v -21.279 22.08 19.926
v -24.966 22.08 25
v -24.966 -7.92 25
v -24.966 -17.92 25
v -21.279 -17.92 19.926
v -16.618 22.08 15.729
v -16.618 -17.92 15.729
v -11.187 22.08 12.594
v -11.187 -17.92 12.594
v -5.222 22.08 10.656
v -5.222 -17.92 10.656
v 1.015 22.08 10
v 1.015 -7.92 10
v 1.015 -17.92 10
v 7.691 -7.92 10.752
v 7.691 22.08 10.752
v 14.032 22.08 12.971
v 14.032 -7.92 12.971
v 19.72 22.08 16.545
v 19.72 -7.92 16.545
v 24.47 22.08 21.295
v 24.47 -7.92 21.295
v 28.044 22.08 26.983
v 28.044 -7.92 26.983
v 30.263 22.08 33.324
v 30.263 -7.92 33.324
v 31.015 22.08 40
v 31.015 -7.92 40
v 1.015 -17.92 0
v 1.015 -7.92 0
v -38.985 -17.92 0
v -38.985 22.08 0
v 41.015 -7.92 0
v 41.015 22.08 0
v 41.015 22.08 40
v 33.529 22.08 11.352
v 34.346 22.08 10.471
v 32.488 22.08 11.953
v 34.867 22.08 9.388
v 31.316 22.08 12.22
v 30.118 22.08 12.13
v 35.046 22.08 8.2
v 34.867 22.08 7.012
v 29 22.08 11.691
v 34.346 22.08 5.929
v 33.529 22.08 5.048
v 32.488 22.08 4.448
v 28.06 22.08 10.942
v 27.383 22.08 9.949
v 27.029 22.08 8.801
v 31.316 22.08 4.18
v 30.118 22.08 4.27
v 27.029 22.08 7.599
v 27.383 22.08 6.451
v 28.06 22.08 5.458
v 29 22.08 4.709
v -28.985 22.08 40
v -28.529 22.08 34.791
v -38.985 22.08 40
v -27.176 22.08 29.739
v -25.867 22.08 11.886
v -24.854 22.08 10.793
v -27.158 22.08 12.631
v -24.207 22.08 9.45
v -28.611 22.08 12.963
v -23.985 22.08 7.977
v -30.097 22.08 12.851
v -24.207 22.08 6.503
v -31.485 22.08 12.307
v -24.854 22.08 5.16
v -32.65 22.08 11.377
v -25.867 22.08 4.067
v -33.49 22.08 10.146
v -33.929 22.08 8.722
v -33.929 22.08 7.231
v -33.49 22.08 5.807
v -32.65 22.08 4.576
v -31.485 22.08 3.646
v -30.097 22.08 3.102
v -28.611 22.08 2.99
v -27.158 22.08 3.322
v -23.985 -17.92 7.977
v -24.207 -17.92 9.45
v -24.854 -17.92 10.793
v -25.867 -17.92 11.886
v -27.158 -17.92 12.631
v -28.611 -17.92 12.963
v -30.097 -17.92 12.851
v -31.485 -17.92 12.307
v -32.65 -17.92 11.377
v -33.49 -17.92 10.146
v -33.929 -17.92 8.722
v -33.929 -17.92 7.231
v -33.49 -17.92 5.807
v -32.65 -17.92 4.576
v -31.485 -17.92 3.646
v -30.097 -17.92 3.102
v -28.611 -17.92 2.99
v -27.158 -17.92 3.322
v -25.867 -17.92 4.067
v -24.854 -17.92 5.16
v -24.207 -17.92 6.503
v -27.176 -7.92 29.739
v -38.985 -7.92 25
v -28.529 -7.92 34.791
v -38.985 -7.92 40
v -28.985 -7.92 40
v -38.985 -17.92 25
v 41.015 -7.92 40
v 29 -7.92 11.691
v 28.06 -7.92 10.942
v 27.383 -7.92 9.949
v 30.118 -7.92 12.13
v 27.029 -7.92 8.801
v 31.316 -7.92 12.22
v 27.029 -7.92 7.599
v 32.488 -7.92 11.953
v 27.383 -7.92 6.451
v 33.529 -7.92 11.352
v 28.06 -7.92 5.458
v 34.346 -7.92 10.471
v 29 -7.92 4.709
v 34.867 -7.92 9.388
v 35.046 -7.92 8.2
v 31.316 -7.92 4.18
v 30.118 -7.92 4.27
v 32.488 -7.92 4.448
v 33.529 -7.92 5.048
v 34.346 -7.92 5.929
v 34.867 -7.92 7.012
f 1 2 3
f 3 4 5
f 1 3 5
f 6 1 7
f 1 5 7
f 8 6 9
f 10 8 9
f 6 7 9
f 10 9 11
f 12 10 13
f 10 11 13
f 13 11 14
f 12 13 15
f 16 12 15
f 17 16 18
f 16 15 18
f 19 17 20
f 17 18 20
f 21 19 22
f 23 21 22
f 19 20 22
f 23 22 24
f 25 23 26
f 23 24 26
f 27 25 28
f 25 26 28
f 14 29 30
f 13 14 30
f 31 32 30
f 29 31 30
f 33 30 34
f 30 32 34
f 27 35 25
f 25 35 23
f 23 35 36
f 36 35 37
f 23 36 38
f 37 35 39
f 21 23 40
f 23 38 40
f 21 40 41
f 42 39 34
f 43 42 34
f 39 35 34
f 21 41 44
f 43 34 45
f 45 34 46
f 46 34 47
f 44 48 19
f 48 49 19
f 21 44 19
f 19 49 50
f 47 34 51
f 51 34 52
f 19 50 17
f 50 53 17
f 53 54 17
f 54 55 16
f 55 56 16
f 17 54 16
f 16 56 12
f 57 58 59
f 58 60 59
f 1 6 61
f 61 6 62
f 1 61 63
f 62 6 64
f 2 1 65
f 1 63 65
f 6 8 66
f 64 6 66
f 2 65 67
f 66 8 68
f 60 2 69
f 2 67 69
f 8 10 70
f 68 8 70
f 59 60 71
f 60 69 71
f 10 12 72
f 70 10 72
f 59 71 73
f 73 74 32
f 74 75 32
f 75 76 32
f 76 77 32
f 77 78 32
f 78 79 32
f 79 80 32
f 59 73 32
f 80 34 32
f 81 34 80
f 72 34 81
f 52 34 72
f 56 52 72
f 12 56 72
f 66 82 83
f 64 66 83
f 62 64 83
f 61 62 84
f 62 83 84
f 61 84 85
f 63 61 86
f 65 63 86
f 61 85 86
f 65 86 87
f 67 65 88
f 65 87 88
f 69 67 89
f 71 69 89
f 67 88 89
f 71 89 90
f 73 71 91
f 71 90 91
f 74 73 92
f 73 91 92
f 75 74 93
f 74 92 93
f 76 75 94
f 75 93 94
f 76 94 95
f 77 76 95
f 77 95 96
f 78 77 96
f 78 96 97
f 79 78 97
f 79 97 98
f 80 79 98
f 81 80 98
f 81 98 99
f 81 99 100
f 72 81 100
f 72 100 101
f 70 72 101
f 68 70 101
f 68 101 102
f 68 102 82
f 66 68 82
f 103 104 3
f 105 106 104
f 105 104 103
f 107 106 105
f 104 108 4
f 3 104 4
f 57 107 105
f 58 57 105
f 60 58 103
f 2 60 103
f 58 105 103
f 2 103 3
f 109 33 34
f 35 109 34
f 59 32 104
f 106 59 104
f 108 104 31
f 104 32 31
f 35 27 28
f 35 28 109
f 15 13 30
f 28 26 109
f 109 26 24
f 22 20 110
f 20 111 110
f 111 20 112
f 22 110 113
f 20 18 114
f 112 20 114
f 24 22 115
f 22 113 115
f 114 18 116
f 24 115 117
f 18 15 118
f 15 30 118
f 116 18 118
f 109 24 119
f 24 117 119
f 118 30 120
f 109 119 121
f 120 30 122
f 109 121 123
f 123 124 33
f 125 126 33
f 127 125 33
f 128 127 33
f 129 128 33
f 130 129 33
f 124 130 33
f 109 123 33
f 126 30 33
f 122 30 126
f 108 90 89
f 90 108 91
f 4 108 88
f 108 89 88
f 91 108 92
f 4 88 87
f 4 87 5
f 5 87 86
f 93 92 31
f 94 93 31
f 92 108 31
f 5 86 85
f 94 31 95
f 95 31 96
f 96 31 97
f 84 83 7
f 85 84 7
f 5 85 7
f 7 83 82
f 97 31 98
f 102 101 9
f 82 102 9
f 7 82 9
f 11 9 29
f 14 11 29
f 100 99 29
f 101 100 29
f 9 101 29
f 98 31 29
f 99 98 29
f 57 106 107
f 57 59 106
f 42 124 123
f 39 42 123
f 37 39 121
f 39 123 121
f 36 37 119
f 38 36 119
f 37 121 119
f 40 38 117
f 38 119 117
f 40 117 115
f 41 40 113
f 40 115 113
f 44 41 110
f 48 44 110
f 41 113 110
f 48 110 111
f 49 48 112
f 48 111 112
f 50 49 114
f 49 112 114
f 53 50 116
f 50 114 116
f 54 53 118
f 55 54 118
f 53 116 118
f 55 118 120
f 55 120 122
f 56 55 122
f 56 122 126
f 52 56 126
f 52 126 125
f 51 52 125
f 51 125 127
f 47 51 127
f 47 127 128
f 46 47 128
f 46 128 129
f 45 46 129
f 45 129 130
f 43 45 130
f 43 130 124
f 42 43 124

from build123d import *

# Parameters (mm, degrees)
F1_DEPTH = 40
F2_R     = 5
F2_R_2   = 4.0311299375
F3_DEPTH = 40.001
F5_DEPTH = 10


with BuildPart() as f1:
    # F0 (on Top) → F1 (new body)
    with BuildSketch(Plane.XY):
        Polygon((41.0151937604, 22.0804412934), (-38.9848062396, 22.0804412934), (-38.9848062396, -17.9195587066), (1.0151937604, -17.9195587066), (1.0151937604, -7.9195587066), (41.0151937604, -7.9195587066), align=None)
    extrude(amount=F1_DEPTH)

    # F2 (on face) → F3 (cut, through all)
    with BuildSketch(Plane.XZ.offset(17.9195587066)):
        with BuildLine():
            ThreePointArc((1.0151937604, 10), (22.228397196, 18.7867965644), (31.0151937604, 40))
            ThreePointArc((31.0151937604, 40), (3.5208867316, 69.8951752417), (-28.5662397552, 44.9938753651))
            Line((-28.5662397552, 44.9938753651), (-24.9655683531, 44.9938753651))
            Line((-24.9655683531, 44.9938753651), (-24.9655683531, 40))
            Line((-24.9655683531, 40), (1.0151937604, 40))
            Line((1.0151937604, 40), (1.0151937604, 10))
        make_face()
        with BuildLine():
            ThreePointArc((-24.9655683531, 25), (-13.9848062396, 14.0192378865), (1.0151937604, 10))
            Line((1.0151937604, 10), (1.0151937604, 40))
            Line((1.0151937604, 40), (-24.9655683531, 40))
            Line((-24.9655683531, 40), (-24.9655683531, 25))
        make_face()
        with BuildLine():
            Line((-24.9655683531, 40), (-28.9848062396, 40))
            ThreePointArc((-28.9848062396, 40), (-27.9625810283, 32.2354286469), (-24.9655683531, 25))
            Line((-24.9655683531, 25), (-24.9655683531, 40))
        make_face()
        with Locations((-28.9848062396, 7.9765189439)):
            Circle(F2_R)
        with Locations((31.0151937604, 8.2001261983)):
            Circle(F2_R_2)
        with BuildLine():
            Line((-24.9655683531, 44.9938753651), (-28.5662397552, 44.9938753651))
            ThreePointArc((-28.5662397552, 44.9938753651), (-28.8799814813, 42.5056929712), (-28.9848062396, 40))
            Line((-28.9848062396, 40), (-24.9655683531, 40))
            Line((-24.9655683531, 40), (-24.9655683531, 44.9938753651))
        make_face()
    extrude(amount=-F3_DEPTH, mode=Mode.SUBTRACT)

    # F4 (on face) → F5 (cut)
    with BuildSketch(Plane.XZ.offset(17.9195587066)):
        with BuildLine():
            Line((-19.918359757, 48.6072202153), (-45.8058249796, 48.6072202153))
            Line((-45.8058249796, 48.6072202153), (-45.8058249796, 25))
            Line((-45.8058249796, 25), (-38.9848062396, 25))
            Line((-38.9848062396, 25), (-38.9848062396, 40))
            Line((-38.9848062396, 40), (-28.9848062396, 40))
            ThreePointArc((-28.9848062396, 40), (-27.9625810283, 32.2354286469), (-24.9655683531, 25))
            Line((-24.9655683531, 25), (-19.918359757, 25))
            Line((-19.918359757, 25), (-19.918359757, 48.6072202153))
        make_face()
        with BuildLine():
            Line((-38.9848062396, 40), (-38.9848062396, 25))
            Line((-38.9848062396, 25), (-24.9655683531, 25))
            ThreePointArc((-24.9655683531, 25), (-27.9625810283, 32.2354286469), (-28.9848062396, 40))
            Line((-28.9848062396, 40), (-38.9848062396, 40))
        make_face()
    extrude(amount=-F5_DEPTH, mode=Mode.SUBTRACT)


solid = f1.part
